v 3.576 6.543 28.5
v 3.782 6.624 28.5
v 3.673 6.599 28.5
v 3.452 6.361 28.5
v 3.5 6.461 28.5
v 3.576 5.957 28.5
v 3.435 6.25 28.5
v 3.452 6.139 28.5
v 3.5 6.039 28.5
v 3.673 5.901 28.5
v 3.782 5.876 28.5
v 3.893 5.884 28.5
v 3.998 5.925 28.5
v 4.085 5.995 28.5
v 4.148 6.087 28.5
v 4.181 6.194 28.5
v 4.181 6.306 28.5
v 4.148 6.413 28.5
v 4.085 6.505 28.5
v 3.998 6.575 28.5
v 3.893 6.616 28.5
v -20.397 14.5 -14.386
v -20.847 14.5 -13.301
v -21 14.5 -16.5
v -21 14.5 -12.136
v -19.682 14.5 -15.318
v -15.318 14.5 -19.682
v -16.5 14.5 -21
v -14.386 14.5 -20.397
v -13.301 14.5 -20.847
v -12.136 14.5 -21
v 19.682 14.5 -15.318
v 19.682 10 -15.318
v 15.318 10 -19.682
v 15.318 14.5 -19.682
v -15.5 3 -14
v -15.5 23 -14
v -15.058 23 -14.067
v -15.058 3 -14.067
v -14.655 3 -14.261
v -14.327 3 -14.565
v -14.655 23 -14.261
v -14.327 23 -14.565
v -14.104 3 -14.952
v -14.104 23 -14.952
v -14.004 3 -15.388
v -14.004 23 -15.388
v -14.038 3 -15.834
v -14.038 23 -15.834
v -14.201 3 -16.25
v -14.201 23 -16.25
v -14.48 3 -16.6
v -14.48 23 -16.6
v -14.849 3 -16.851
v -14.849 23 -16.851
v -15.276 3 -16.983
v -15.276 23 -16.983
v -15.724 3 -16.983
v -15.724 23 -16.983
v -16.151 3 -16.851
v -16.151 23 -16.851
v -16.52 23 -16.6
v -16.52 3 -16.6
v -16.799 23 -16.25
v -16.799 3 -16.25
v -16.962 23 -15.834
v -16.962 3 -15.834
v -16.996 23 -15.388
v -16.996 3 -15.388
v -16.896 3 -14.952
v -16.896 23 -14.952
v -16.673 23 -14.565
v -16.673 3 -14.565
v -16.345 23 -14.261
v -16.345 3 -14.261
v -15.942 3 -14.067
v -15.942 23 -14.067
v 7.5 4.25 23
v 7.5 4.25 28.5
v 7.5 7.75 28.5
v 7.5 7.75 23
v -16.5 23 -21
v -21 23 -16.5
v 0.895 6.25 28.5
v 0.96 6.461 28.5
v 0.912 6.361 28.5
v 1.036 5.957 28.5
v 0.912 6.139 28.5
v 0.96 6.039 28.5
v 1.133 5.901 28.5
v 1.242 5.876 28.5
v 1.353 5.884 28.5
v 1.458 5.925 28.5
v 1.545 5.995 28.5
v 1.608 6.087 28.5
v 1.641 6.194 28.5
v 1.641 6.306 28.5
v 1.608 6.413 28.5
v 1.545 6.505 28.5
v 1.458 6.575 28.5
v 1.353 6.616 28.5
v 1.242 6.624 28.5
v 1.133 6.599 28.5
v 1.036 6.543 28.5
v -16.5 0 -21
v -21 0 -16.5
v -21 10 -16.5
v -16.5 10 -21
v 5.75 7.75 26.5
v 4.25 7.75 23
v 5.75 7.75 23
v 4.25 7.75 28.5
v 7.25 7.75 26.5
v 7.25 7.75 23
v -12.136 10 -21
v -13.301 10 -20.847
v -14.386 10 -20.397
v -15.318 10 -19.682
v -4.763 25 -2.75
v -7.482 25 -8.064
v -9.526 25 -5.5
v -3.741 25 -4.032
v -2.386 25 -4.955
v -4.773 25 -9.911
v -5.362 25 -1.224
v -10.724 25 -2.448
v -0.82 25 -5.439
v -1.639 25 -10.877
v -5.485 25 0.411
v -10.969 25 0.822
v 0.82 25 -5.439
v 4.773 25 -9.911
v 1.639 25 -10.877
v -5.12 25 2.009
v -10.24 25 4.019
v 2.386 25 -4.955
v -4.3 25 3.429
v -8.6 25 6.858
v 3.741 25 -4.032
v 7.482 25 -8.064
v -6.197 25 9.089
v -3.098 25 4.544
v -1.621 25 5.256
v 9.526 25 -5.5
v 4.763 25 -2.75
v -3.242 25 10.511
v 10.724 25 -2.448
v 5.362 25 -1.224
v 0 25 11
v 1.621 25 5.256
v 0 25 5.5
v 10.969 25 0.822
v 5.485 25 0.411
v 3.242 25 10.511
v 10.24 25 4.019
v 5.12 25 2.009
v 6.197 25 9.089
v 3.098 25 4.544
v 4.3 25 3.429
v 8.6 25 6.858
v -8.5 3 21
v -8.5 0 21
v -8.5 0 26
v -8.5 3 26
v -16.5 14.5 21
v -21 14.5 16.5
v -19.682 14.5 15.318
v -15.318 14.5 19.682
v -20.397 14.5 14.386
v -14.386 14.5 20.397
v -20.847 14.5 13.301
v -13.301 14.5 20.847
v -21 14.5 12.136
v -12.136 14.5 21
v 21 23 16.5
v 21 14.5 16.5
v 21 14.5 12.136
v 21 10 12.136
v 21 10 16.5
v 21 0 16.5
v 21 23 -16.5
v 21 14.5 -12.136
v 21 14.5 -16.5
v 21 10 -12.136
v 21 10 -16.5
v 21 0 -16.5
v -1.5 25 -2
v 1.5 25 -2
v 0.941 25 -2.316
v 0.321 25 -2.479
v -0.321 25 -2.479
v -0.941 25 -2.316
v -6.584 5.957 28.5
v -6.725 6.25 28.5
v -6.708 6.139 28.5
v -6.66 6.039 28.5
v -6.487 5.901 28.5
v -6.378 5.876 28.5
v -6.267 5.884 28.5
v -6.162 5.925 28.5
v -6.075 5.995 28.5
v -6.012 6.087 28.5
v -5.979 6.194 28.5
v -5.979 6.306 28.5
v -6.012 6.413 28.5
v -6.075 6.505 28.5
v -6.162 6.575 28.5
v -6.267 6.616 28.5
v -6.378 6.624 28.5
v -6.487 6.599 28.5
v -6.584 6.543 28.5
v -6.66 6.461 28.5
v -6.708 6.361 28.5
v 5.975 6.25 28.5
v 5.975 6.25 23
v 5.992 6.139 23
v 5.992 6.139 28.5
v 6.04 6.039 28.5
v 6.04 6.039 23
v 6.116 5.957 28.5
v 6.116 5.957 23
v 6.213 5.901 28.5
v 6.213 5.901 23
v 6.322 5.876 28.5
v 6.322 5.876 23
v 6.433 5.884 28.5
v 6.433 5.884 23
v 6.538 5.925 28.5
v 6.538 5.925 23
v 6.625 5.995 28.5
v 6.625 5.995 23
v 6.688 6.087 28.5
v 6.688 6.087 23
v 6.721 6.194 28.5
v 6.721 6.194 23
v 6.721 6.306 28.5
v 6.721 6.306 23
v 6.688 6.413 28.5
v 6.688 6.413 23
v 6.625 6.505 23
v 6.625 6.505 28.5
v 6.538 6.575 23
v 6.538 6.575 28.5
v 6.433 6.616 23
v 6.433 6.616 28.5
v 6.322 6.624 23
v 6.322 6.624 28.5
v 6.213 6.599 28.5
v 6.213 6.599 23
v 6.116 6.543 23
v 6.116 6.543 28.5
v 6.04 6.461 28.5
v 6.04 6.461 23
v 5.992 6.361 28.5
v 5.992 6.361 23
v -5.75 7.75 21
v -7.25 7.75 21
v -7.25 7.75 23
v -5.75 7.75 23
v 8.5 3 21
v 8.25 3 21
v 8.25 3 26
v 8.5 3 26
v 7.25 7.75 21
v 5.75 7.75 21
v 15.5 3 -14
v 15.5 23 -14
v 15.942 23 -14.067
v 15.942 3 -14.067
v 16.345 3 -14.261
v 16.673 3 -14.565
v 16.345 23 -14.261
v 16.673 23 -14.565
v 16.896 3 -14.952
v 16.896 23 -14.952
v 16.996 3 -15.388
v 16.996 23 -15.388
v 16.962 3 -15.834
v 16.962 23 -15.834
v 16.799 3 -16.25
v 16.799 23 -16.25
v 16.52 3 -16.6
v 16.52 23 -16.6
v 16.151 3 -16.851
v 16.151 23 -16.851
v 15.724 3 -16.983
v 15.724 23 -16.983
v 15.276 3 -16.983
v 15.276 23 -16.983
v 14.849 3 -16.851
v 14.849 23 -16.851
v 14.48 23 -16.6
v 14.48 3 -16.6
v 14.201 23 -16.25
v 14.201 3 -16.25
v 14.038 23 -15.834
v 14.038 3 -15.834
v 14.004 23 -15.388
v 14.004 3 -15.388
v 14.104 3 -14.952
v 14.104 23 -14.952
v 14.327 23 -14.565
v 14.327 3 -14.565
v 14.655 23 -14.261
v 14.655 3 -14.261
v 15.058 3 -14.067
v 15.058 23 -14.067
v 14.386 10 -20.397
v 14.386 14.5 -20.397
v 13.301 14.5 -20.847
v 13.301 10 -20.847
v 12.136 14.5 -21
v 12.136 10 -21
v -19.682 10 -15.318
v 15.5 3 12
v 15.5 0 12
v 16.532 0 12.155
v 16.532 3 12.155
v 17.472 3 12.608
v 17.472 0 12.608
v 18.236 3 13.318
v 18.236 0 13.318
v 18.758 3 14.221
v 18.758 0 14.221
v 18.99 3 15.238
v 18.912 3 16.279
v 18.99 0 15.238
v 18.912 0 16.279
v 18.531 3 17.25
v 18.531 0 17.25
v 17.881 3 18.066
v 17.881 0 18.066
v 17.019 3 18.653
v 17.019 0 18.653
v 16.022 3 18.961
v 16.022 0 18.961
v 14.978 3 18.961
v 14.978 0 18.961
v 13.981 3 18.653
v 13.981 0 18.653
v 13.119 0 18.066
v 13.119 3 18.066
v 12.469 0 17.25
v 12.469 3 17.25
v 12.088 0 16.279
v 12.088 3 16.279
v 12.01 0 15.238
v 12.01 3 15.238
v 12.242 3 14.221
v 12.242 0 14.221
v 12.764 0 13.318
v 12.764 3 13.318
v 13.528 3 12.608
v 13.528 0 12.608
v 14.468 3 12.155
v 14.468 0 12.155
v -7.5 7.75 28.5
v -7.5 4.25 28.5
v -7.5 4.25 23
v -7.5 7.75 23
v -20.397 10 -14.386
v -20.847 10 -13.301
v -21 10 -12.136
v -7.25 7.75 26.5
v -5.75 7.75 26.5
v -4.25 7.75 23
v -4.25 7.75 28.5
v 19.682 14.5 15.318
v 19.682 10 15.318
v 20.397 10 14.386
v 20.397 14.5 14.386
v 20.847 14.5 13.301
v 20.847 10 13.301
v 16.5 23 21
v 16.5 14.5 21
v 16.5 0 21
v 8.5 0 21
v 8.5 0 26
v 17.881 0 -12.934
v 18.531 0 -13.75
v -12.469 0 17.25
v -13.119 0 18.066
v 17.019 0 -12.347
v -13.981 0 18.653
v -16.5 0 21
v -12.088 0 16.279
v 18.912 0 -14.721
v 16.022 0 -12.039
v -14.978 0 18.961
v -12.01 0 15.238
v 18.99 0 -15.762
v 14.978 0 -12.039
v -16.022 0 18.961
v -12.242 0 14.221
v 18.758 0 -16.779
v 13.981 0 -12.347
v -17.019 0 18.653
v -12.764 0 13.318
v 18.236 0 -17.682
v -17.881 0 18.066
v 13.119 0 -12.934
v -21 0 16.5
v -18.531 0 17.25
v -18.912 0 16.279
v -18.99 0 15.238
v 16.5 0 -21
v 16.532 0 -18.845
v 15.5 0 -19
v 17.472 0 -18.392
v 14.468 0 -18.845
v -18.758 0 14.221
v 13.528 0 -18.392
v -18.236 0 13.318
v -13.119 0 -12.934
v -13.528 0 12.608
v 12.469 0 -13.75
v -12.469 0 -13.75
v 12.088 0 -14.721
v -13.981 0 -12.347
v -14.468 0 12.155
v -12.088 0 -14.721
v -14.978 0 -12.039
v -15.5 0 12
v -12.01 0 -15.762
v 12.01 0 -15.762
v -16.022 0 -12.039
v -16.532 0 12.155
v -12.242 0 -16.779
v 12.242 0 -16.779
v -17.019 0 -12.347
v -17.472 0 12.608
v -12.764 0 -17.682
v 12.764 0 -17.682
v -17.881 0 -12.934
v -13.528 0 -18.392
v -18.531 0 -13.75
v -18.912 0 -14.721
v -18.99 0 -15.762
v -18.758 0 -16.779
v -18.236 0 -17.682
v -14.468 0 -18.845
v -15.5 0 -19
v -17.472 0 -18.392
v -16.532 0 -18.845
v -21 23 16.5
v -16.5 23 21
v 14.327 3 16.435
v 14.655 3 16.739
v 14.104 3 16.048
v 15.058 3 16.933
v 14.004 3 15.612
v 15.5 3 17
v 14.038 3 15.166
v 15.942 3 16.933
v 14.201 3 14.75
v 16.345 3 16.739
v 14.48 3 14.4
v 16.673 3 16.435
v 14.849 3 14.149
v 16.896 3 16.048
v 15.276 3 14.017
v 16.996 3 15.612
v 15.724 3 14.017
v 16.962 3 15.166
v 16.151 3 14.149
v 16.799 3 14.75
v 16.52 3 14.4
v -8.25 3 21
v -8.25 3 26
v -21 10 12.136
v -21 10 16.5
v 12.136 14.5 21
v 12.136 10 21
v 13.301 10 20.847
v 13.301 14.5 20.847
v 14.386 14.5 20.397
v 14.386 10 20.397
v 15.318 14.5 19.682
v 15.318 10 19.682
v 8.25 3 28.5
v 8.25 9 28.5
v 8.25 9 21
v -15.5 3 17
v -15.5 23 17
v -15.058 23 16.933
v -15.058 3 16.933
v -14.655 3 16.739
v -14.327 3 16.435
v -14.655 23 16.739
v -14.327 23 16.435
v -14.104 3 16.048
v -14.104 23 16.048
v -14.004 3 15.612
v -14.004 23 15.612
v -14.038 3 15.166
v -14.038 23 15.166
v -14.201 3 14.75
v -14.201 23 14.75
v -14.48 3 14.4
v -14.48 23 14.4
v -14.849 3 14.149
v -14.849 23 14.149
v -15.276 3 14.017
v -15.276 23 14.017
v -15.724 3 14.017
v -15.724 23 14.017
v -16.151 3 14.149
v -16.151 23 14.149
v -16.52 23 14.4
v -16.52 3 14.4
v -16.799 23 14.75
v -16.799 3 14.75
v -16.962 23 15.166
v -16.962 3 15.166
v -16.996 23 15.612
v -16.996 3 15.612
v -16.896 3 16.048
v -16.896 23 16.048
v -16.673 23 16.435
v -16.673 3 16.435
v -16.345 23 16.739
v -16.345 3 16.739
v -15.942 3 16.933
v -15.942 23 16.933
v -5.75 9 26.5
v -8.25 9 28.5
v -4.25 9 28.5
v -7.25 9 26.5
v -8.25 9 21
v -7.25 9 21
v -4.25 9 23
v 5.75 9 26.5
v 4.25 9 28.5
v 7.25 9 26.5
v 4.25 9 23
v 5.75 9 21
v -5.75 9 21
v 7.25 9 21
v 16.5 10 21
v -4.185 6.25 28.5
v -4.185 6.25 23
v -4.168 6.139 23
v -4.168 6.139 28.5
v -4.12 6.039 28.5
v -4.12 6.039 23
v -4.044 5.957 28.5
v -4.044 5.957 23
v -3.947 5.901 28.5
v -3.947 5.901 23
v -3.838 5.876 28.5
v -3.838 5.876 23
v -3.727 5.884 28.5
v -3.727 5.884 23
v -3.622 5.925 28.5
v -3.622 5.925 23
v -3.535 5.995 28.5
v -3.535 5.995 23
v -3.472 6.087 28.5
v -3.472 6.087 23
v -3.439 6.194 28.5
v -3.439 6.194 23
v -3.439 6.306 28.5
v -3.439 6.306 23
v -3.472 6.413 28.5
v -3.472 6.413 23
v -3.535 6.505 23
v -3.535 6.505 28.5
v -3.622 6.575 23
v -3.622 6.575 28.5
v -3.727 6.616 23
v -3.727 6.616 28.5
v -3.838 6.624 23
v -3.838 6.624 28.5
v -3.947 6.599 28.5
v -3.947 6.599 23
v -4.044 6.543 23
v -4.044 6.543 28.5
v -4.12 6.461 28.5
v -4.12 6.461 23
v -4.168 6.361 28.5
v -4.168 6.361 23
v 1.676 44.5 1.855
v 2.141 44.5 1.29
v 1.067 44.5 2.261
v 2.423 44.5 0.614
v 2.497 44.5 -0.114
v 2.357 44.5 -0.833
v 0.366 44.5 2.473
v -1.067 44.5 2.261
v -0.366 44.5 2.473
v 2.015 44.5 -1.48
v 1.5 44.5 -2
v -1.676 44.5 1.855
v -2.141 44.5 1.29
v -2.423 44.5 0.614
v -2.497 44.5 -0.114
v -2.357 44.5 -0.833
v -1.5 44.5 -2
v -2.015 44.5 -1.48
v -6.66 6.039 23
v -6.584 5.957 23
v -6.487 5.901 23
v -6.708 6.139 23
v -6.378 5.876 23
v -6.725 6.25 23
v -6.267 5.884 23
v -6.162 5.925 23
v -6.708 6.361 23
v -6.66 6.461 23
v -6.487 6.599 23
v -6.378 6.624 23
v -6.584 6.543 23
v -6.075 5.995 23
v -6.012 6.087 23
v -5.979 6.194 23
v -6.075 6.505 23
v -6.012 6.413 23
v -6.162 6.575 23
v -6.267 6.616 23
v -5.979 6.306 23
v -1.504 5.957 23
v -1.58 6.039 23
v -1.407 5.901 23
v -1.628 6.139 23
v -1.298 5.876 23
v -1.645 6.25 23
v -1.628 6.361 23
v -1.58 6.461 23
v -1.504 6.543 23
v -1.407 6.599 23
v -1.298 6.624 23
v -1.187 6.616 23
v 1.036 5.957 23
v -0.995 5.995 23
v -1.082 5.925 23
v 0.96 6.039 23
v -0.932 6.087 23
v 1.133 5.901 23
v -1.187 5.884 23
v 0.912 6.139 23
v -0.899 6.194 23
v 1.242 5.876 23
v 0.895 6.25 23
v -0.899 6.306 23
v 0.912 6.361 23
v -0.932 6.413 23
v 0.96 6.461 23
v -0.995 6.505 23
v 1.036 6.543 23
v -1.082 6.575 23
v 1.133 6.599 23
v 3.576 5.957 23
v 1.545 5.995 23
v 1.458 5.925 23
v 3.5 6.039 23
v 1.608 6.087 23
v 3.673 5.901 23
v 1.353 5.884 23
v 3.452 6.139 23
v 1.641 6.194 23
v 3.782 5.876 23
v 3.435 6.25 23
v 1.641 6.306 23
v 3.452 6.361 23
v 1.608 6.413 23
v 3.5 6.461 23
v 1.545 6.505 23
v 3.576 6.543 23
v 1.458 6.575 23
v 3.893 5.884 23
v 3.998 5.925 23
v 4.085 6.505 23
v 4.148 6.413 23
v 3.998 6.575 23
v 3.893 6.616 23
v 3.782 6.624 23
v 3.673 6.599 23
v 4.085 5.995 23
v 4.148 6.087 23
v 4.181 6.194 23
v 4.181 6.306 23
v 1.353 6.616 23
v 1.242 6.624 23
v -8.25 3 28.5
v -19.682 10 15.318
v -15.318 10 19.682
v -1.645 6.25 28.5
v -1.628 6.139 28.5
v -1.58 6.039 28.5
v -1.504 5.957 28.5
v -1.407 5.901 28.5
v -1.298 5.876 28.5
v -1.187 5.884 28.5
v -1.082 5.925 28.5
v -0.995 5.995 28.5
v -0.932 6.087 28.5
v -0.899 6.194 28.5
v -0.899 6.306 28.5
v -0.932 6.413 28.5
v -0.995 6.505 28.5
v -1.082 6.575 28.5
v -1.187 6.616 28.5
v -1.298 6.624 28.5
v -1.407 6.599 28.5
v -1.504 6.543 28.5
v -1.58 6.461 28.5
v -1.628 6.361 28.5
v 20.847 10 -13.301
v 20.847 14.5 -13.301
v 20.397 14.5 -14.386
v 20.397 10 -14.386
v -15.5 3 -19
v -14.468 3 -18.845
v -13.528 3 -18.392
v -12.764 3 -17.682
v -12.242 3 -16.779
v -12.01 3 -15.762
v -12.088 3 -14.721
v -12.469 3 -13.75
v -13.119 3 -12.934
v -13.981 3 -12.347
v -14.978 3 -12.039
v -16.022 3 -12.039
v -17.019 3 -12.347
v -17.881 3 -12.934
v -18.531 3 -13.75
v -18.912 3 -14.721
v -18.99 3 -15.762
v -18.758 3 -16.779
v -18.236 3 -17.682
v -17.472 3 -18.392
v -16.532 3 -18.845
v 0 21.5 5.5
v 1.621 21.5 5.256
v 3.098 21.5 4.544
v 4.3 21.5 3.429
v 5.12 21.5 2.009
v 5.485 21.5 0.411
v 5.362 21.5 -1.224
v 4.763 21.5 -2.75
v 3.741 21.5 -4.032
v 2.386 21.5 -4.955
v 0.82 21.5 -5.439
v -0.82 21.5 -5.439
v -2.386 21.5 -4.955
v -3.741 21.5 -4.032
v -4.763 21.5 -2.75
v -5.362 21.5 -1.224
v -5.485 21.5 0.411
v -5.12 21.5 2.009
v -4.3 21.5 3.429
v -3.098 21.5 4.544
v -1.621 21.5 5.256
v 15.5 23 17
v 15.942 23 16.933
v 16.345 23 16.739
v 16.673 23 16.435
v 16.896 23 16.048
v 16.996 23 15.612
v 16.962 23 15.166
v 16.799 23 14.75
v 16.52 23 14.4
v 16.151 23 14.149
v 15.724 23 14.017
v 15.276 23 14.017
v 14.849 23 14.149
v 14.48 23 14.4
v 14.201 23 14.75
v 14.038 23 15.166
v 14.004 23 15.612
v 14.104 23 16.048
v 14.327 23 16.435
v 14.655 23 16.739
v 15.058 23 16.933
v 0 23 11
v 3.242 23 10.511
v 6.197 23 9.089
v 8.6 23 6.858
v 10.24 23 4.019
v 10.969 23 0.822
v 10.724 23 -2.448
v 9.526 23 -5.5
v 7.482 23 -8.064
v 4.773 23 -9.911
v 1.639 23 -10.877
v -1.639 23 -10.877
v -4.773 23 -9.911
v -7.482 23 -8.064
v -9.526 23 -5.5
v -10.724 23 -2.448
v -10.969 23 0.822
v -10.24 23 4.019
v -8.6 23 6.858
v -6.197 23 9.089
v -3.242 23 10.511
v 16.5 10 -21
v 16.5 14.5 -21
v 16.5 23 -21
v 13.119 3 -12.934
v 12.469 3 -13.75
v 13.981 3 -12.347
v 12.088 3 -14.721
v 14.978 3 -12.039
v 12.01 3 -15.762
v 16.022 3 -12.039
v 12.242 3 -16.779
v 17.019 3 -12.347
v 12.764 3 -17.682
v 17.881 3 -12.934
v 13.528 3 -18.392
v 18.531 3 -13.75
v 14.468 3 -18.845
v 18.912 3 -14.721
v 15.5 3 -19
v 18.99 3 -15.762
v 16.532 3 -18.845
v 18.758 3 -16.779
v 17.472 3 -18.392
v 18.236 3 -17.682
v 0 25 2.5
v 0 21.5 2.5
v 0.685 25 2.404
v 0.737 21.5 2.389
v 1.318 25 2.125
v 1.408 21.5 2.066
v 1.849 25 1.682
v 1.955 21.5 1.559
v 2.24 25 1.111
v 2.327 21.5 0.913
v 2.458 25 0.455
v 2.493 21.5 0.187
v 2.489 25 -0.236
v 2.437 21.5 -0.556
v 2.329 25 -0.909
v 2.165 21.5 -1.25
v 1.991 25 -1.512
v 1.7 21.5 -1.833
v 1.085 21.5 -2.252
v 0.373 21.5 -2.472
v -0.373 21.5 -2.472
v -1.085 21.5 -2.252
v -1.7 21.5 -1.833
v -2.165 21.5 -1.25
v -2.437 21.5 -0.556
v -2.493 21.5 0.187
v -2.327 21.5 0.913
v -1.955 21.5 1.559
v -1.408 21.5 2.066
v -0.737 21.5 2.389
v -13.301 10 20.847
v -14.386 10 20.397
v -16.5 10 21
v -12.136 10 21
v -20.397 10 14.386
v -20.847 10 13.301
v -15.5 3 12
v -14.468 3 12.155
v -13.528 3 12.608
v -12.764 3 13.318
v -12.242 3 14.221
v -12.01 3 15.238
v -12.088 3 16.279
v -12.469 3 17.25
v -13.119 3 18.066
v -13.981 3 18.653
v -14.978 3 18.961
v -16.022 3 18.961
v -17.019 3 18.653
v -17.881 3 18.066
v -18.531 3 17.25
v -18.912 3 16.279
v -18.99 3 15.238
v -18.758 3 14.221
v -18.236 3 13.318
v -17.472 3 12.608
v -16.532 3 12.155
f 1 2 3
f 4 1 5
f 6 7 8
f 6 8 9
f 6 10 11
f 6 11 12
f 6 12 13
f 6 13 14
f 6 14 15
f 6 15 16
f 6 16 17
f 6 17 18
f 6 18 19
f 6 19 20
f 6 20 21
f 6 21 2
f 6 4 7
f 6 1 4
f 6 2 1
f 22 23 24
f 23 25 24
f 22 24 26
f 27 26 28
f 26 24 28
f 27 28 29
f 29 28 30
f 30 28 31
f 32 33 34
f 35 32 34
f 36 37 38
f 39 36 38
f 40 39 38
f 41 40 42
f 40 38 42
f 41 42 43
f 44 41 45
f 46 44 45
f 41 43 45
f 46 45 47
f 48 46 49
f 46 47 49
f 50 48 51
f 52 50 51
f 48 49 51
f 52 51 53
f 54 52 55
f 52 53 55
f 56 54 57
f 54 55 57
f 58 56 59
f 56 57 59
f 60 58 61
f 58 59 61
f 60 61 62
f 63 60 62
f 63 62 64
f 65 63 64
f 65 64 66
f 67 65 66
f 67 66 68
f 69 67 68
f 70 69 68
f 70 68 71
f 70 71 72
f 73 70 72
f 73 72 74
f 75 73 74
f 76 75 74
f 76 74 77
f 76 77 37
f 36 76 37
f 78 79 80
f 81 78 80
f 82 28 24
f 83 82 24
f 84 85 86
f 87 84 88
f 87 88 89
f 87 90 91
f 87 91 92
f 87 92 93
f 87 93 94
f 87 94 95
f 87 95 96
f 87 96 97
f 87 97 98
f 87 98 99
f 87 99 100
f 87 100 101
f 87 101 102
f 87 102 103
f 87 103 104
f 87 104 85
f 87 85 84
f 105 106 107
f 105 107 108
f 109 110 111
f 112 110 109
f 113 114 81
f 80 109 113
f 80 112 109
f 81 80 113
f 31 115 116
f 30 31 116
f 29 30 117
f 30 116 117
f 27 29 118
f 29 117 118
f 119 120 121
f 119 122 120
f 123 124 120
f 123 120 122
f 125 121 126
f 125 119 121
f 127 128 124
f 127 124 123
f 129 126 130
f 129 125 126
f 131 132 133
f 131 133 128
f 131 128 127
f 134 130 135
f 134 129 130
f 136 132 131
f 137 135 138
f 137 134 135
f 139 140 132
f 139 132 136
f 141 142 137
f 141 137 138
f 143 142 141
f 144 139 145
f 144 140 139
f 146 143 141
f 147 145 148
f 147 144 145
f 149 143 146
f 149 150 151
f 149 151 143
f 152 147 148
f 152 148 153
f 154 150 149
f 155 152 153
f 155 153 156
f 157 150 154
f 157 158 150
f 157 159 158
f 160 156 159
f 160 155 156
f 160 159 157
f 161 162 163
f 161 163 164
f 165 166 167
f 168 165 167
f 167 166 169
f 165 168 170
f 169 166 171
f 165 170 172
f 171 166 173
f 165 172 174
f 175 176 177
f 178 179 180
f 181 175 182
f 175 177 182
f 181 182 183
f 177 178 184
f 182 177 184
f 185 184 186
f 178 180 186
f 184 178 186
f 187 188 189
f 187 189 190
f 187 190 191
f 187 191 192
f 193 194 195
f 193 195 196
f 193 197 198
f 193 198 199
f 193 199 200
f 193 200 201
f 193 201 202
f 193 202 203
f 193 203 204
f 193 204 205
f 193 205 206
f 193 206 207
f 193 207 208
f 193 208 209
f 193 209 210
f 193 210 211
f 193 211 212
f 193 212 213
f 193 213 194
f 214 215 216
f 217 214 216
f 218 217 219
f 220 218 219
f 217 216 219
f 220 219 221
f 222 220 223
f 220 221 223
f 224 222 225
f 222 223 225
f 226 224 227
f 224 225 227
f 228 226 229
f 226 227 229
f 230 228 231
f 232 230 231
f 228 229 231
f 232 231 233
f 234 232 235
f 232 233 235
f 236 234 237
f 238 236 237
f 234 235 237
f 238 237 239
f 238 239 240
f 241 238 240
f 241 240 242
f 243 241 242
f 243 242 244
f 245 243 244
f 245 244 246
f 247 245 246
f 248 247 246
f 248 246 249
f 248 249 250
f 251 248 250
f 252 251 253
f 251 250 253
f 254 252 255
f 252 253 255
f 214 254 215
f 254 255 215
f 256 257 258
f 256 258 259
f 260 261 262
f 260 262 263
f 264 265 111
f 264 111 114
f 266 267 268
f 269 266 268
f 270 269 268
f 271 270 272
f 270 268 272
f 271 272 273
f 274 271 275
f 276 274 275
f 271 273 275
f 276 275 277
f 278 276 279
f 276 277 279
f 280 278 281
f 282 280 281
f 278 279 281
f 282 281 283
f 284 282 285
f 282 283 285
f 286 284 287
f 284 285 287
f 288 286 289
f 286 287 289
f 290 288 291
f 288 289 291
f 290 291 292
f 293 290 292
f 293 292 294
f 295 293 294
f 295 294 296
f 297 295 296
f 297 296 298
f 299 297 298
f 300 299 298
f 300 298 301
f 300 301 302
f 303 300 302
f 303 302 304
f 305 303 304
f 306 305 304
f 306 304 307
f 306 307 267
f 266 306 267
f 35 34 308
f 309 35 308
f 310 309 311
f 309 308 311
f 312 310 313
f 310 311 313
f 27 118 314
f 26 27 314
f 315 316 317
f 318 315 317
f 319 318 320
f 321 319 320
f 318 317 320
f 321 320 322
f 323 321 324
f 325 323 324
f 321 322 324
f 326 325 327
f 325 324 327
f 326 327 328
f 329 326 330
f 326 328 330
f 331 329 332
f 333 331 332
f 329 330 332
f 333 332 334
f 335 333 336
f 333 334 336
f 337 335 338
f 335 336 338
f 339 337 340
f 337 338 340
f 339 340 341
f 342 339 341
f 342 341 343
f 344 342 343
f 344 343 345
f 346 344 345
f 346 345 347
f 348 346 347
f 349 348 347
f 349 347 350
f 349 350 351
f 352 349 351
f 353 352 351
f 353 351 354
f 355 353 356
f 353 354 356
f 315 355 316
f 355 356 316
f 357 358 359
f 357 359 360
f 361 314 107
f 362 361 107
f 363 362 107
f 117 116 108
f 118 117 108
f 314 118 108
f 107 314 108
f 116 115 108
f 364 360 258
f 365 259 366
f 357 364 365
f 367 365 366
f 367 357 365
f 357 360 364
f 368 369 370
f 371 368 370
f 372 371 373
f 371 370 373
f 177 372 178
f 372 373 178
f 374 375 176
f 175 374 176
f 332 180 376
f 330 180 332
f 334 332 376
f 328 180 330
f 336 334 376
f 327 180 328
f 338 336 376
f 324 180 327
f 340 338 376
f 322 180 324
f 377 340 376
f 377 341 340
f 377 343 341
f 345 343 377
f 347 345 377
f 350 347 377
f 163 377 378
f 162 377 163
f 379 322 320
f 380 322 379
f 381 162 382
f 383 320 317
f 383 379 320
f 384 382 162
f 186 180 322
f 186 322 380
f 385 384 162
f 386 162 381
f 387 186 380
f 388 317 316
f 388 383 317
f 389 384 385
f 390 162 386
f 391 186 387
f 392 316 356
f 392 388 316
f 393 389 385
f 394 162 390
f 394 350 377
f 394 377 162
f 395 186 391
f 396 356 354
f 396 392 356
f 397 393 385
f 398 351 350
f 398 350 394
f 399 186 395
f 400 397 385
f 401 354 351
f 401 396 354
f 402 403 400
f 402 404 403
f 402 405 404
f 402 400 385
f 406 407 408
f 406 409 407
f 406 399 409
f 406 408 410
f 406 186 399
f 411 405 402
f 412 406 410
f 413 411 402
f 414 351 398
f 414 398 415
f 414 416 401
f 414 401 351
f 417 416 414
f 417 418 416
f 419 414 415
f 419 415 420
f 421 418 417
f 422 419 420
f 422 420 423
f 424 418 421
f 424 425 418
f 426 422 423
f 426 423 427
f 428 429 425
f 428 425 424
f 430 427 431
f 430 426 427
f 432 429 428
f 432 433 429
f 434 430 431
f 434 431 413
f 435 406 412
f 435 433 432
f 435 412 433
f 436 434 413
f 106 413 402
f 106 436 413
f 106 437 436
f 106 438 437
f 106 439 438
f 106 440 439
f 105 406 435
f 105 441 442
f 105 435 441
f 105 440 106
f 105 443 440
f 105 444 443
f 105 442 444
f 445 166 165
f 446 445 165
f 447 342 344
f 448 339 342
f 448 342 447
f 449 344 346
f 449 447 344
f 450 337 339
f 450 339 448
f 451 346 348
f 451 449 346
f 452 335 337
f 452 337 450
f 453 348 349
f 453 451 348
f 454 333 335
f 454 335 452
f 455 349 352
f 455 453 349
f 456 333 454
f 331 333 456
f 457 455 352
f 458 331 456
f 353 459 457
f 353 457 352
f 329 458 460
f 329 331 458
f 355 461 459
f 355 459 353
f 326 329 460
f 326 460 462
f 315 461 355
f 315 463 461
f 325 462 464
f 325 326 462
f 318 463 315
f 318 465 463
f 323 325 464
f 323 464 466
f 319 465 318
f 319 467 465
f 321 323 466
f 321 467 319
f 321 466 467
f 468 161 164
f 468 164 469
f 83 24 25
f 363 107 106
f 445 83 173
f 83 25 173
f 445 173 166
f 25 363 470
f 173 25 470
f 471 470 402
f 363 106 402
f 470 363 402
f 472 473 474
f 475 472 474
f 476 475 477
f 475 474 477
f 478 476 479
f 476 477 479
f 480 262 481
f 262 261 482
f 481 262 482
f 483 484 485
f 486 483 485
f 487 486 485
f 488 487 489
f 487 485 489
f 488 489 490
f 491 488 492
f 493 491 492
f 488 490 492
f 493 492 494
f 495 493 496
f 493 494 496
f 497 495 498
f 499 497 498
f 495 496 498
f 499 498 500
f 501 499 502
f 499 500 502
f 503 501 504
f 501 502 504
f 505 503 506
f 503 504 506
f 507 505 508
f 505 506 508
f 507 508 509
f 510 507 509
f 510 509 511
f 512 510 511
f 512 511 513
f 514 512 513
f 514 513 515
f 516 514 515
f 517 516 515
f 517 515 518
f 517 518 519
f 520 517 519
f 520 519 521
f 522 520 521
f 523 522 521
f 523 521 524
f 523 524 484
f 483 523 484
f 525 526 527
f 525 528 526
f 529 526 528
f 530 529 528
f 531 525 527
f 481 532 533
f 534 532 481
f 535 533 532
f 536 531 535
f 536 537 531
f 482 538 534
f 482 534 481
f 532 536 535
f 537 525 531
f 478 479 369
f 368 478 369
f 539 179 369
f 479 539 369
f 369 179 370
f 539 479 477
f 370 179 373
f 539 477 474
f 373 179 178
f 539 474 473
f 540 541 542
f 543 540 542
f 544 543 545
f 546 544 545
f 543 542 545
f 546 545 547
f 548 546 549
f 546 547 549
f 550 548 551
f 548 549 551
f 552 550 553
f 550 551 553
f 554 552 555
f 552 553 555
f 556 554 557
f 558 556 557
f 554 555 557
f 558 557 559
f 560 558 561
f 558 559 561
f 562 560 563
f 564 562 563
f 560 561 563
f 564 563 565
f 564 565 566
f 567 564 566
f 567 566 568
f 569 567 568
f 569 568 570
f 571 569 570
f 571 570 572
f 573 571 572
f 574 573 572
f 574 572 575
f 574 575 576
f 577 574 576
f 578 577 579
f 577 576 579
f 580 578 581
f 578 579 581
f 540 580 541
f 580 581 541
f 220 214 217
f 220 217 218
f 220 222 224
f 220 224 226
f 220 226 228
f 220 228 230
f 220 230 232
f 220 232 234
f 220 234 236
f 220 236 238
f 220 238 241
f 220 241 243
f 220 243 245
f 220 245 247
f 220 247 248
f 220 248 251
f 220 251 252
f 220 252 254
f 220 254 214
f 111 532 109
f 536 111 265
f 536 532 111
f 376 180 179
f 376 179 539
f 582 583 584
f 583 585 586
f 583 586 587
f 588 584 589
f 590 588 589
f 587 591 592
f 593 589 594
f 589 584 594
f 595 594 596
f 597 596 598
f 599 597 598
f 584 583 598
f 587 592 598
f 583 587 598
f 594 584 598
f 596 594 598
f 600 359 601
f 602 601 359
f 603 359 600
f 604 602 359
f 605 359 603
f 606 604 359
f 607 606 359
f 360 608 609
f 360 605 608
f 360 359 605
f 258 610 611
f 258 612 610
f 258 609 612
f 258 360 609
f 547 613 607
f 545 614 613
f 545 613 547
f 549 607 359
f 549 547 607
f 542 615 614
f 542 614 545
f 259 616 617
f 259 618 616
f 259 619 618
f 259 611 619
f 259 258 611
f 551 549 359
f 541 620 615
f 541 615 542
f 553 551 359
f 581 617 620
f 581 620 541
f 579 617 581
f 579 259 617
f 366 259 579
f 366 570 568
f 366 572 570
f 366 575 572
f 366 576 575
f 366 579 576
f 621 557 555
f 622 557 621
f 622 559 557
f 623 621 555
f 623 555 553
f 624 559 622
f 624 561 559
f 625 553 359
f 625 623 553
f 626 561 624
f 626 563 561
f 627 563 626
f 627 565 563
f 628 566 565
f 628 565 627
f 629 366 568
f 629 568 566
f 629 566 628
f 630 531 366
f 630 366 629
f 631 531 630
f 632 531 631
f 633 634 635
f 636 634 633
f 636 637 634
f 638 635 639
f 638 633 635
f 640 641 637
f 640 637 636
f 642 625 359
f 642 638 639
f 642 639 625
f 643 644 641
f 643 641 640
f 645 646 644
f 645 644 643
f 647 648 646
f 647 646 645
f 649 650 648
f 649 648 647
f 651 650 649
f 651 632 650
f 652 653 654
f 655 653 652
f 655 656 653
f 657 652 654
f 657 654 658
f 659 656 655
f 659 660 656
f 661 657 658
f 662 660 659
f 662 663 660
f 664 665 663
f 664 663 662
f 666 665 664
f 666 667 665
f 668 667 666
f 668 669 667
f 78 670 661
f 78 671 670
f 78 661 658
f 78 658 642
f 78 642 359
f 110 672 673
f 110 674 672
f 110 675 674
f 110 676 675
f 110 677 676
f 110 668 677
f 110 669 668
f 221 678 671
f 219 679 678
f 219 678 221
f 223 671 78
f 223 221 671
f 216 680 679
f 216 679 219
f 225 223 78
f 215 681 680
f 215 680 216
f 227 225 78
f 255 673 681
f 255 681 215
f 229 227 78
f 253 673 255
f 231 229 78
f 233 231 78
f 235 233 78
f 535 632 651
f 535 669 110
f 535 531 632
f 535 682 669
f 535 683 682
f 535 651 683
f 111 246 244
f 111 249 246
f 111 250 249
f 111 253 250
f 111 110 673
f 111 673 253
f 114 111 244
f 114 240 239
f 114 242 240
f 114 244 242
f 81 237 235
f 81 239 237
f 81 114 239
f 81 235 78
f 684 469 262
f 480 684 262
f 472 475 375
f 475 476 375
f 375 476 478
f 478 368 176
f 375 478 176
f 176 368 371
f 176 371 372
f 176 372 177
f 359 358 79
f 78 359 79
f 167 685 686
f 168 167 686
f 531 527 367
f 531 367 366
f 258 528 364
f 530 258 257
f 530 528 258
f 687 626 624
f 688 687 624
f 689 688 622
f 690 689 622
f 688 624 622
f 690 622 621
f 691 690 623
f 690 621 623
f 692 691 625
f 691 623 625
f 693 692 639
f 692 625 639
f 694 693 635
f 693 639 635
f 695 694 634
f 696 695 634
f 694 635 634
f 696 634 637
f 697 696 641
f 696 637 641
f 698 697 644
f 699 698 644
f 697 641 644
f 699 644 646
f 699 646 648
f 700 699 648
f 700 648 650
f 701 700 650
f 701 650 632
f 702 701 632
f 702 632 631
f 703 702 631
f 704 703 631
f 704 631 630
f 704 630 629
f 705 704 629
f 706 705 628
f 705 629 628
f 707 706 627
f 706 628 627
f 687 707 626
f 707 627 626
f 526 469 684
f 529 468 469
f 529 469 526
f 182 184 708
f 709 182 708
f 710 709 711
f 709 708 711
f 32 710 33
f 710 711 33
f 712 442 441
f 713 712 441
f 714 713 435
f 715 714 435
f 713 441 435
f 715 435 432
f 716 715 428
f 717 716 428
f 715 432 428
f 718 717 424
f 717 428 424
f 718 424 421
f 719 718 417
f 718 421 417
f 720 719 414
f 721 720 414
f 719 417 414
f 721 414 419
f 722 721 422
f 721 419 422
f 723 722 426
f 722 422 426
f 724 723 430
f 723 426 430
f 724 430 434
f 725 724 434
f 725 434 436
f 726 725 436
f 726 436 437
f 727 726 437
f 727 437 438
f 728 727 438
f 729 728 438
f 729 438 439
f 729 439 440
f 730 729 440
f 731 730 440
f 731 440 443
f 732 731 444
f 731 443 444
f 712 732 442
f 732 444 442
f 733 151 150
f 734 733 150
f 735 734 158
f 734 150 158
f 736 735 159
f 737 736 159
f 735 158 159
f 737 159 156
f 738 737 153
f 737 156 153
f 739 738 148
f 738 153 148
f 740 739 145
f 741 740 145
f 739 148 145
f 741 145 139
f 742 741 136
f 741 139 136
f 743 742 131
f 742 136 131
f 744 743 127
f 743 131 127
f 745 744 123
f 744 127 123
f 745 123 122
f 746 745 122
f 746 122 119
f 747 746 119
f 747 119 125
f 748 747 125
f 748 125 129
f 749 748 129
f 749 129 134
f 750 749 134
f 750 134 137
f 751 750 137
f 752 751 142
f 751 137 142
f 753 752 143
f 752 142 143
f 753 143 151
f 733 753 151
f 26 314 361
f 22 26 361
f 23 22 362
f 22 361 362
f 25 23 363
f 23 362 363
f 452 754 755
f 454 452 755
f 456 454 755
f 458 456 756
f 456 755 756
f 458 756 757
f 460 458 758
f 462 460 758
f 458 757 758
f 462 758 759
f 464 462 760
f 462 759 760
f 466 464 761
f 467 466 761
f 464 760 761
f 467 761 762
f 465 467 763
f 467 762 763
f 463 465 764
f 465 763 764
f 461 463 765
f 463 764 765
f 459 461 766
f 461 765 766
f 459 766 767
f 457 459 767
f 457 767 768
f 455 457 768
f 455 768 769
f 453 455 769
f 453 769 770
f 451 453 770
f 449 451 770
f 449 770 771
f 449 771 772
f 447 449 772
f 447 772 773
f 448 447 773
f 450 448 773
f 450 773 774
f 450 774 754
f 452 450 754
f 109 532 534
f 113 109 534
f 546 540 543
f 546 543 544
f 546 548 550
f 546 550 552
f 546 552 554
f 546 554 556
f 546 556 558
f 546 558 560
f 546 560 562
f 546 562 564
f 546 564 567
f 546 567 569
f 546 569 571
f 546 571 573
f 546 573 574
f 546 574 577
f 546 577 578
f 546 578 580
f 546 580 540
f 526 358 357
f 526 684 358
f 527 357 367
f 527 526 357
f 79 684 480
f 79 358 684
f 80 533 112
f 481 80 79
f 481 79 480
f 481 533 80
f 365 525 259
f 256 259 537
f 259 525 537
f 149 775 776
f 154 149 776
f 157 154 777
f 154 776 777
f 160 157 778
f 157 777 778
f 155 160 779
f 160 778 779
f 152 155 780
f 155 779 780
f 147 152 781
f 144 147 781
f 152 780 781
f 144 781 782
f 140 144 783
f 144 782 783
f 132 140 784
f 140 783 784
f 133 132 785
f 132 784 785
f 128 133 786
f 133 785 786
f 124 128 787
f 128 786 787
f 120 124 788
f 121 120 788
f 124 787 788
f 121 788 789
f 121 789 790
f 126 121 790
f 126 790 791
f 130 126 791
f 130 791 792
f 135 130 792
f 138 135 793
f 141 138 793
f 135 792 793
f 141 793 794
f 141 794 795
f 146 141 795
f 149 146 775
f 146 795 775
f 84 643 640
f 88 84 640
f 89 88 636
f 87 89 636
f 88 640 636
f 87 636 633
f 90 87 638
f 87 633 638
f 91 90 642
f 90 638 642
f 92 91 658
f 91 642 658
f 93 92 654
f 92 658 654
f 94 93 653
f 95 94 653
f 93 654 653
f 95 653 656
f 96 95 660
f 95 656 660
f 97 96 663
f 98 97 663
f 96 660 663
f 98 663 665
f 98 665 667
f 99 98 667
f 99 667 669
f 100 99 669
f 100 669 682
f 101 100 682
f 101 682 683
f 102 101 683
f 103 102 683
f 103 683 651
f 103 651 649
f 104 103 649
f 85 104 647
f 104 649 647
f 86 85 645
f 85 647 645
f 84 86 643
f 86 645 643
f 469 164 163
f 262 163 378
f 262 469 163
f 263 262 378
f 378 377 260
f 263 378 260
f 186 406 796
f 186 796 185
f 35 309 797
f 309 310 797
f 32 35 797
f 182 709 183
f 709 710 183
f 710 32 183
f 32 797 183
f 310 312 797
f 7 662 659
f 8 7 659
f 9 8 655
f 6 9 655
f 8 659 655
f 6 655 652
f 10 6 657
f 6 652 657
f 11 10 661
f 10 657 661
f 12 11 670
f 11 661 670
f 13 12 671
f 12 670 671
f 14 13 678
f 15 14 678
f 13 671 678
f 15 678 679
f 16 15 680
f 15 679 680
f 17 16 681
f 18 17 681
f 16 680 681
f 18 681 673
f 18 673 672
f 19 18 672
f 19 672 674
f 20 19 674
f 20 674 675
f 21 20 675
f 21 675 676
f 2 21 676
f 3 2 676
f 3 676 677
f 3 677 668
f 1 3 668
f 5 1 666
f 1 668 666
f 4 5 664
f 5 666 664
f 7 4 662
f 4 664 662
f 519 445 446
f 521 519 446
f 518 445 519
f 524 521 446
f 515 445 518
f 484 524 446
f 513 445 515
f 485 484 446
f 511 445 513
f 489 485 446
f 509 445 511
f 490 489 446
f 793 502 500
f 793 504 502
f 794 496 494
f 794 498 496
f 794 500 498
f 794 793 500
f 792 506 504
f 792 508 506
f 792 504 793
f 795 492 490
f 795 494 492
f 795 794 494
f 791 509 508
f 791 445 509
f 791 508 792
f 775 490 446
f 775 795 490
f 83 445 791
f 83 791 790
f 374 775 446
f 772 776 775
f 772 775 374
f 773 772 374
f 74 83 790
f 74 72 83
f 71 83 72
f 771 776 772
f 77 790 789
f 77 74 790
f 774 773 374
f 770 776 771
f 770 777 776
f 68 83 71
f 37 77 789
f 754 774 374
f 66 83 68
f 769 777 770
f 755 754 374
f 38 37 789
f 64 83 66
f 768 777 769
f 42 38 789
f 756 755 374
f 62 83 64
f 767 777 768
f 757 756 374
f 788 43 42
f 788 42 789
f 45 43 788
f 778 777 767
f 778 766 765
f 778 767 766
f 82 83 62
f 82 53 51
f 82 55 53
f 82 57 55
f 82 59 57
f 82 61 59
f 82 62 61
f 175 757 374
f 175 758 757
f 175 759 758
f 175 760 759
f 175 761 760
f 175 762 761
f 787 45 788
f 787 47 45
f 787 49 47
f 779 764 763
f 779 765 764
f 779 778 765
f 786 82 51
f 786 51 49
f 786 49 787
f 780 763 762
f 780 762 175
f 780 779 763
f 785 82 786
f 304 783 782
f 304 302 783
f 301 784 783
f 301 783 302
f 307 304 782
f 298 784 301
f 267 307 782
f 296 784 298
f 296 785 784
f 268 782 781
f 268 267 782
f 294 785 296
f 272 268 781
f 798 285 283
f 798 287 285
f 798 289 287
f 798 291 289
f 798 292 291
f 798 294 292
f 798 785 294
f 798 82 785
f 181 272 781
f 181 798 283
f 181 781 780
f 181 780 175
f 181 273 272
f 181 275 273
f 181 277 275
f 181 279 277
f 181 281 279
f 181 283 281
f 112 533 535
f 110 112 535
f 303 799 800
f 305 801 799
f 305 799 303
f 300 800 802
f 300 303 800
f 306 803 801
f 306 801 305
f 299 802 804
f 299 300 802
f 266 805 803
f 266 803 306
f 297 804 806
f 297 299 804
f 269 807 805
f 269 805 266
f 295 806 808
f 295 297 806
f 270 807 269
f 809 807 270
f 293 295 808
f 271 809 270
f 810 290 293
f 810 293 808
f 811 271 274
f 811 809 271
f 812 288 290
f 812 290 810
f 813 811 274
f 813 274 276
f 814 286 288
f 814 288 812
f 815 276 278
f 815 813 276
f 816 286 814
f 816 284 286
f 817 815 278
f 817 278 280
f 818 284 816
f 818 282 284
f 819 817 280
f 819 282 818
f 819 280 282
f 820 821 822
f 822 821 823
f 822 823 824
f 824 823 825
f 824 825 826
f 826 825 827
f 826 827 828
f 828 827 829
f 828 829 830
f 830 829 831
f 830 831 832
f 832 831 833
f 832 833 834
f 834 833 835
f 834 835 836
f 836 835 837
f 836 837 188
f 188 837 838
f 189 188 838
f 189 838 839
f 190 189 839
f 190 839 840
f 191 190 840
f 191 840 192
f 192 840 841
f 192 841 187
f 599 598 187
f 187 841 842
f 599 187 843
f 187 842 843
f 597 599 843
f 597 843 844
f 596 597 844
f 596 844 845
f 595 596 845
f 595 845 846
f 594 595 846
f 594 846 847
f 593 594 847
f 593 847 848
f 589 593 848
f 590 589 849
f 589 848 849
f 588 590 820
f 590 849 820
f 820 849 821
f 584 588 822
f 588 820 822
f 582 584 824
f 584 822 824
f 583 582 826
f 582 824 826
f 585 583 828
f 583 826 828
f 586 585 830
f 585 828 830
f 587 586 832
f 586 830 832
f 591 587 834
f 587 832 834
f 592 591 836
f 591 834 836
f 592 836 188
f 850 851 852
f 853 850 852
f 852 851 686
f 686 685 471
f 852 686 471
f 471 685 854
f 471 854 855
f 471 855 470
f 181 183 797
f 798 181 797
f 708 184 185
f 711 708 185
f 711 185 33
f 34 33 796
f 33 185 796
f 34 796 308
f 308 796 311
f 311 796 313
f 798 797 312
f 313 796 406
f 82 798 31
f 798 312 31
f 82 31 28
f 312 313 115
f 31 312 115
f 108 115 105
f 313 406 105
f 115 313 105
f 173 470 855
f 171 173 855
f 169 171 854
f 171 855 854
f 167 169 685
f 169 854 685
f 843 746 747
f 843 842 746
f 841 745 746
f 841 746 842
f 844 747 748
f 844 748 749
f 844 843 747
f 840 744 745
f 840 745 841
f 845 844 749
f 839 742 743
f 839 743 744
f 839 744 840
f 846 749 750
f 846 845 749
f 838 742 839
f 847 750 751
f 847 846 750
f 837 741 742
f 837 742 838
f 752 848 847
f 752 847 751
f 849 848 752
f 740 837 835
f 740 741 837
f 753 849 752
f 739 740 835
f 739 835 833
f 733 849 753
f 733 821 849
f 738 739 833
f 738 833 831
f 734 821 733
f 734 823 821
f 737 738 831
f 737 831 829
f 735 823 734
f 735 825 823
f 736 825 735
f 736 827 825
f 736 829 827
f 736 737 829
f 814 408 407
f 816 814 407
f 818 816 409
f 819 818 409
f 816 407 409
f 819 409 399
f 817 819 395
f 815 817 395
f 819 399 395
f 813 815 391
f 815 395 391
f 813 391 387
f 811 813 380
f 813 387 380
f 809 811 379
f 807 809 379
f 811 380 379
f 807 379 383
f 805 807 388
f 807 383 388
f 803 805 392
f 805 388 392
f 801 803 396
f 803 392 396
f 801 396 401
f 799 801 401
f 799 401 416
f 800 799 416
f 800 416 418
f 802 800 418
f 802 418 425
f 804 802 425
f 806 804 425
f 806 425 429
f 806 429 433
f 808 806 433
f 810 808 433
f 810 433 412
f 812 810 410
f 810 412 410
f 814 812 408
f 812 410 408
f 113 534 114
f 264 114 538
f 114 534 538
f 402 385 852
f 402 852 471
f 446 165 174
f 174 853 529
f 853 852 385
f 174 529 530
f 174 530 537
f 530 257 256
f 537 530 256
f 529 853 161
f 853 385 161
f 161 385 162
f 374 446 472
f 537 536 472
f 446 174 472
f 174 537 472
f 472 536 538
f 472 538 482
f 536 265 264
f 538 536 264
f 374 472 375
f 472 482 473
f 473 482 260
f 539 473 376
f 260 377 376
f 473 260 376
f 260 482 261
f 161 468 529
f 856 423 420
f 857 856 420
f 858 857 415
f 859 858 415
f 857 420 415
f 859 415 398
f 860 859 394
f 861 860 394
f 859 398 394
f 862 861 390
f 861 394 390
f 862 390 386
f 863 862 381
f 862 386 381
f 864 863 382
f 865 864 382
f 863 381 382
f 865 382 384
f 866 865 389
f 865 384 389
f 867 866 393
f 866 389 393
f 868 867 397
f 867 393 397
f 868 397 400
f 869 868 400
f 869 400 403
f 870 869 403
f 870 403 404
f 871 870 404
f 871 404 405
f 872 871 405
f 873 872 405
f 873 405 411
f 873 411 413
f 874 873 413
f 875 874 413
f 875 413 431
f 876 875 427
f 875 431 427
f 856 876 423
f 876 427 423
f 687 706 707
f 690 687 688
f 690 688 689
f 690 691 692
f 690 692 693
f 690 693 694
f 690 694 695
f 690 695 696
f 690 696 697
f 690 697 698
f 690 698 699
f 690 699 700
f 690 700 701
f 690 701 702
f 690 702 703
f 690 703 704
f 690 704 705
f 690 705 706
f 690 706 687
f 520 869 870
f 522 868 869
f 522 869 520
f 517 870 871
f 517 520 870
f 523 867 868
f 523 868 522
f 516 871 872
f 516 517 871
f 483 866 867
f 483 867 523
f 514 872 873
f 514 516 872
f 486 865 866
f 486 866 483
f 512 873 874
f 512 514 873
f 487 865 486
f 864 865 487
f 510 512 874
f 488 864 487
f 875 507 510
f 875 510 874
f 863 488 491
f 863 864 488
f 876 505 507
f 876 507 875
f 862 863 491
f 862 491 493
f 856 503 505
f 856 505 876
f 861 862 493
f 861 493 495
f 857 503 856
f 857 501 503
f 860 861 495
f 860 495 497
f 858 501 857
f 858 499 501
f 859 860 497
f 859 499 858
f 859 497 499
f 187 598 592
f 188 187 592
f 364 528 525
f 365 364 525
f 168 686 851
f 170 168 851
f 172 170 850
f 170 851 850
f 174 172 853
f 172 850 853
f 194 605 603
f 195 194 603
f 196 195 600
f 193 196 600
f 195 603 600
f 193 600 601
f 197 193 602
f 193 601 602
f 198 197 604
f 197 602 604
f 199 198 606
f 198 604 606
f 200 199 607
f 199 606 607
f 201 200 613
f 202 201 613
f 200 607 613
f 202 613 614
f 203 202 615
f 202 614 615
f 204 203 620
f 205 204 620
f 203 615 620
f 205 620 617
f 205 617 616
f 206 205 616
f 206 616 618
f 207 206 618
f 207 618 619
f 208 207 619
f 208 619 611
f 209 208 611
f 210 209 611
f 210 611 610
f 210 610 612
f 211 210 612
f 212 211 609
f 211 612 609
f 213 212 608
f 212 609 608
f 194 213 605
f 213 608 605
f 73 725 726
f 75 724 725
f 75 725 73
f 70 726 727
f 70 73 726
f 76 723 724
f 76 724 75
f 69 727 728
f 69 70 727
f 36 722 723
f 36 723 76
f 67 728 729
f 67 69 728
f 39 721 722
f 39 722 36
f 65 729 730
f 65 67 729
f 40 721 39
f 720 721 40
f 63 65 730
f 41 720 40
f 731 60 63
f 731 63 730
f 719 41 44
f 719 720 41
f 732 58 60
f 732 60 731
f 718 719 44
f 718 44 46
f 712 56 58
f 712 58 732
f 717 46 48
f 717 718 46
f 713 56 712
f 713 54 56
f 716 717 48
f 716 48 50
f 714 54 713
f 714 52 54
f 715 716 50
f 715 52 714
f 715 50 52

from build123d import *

# Parameters (mm, degrees)
BOSS_EXTRUDE1_DEPTH  = 10
BOSS_EXTRUDE3_DEPTH  = 4.5
BOSS_EXTRUDE4_DEPTH  = 8.5
SKETCH5_R            = 11
BOSS_EXTRUDE5_DEPTH  = 2
CUT_EXTRUDE1_REACH   = 39.563
SKETCH6_R            = 1.5
SKETCH7_R            = 5.5
CUT_EXTRUDE2_DEPTH   = 3.5
SKETCH8_R            = 2.5
BOSS_EXTRUDE6_DEPTH  = 3.5
BOSS_EXTRUDE7_DEPTH  = 19.5
SKETCH10_R           = 3.5
CUT_EXTRUDE3_DEPTH   = 3
SKETCH11_W           = 17
SKETCH11_H           = 3
BOSS_EXTRUDE8_DEPTH  = 5
SKETCH12_W           = 16.5
SKETCH12_H           = 6
BOSS_EXTRUDE9_DEPTH  = 7.5
SKETCH13_W           = 15
SKETCH13_H           = 3.5
CUT_EXTRUDE4_DEPTH   = 5.5
CUT_EXTRUDE5_REACH   = 52.135
SKETCH14_W           = 8.5
SKETCH14_H           = 5.5
SKETCH15_W           = 1.5
SKETCH15_H           = 5.5
CUT_EXTRUDE6_DEPTH   = 1.25
SKETCH16_R           = 0.375
BOSS_EXTRUDE10_DEPTH = 5.5


with BuildPart() as part:
    # Sketch1 → Boss-Extrude1 (new body)
    with BuildSketch(Plane(origin=(0, 0, 0), x_dir=(1, 0, 0), z_dir=(0, 1, 0))):
        Polygon((-21, 16.5), (-16.5, 21), (16.5, 21), (21, 16.5), (21, -16.5), (16.5, -21), (-16.5, -21), (-21, -16.5), align=None)
    extrude(amount=BOSS_EXTRUDE1_DEPTH)

    # Sketch2 → Boss-Extrude3 (add)
    with BuildSketch(Plane(origin=(0, 10, 0), x_dir=(1, 0, 0), z_dir=(0, 1, 0))):
        with BuildLine():
            Line((-15.318019485, 19.681980515), (-19.681980515, 15.318019485))
            ThreePointArc((-19.681980515, 15.318019485), (-20.657457896, 13.858114415), (-21, 12.136038969))
            Line((-21, 12.136038969), (-21, -12.136038969))
            ThreePointArc((-21, -12.136038969), (-20.657457896, -13.858114415), (-19.681980515, -15.318019485))
            Line((-19.681980515, -15.318019485), (-15.318019485, -19.681980515))
            ThreePointArc((-15.318019485, -19.681980515), (-13.858114415, -20.657457896), (-12.136038969, -21))
            Line((-12.136038969, -21), (12.136038969, -21))
            ThreePointArc((12.136038969, -21), (13.858114415, -20.657457896), (15.318019485, -19.681980515))
            Line((15.318019485, -19.681980515), (19.681980515, -15.318019485))
            ThreePointArc((19.681980515, -15.318019485), (20.657457896, -13.858114415), (21, -12.136038969))
            Line((21, -12.136038969), (21, 12.136038969))
            ThreePointArc((21, 12.136038969), (20.657457896, 13.858114415), (19.681980515, 15.318019485))
            Line((19.681980515, 15.318019485), (15.318019485, 19.681980515))
            ThreePointArc((15.318019485, 19.681980515), (13.858114415, 20.657457896), (12.136038969, 21))
            Line((12.136038969, 21), (-12.136038969, 21))
            ThreePointArc((-12.136038969, 21), (-13.858114415, 20.657457896), (-15.318019485, 19.681980515))
        make_face()
    extrude(amount=BOSS_EXTRUDE3_DEPTH)

    # Sketch4 → Boss-Extrude4 (add)
    with BuildSketch(Plane(origin=(0, 14.5, 0), x_dir=(1, 0, 0), z_dir=(0, 1, 0))):
        Polygon((-16.5, 21), (-21, 16.5), (-21, -16.5), (-16.5, -21), (16.5, -21), (21, -16.5), (21, 16.5), (16.5, 21), align=None)
    extrude(amount=BOSS_EXTRUDE4_DEPTH)

    # Sketch5 → Boss-Extrude5 (add)
    with BuildSketch(Plane(origin=(0, 23, 0), x_dir=(1, 0, 0), z_dir=(0, 1, 0))):
        with Locations(Location((0, 0, 0), (0, 0, 270))):
            Circle(SKETCH5_R)
    extrude(amount=BOSS_EXTRUDE5_DEPTH)

    # Sketch6 → Cut-Extrude1 (cut, up to next)
    with BuildSketch(Plane(origin=(0, 23, 0), x_dir=(1, 0, 0), z_dir=(0, 1, 0)), mode=Mode.PRIVATE) as cut_extrude1_sk1:
        with Locations(Location((-15.5, 15.5, 0), (0, 0, 270))):
            Circle(SKETCH6_R)
    cut_extrude1_tool1 = extrude(cut_extrude1_sk1.sketch, amount=-CUT_EXTRUDE1_REACH, mode=Mode.PRIVATE) & part.part
    # Sketch6 → Cut-Extrude1 (cut, up to next)
    with BuildSketch(Plane(origin=(0, 23, 0), x_dir=(1, 0, 0), z_dir=(0, 1, 0)), mode=Mode.PRIVATE) as cut_extrude1_sk2:
        with Locations(Location((15.5, 15.5, 0), (0, 0, 270))):
            Circle(SKETCH6_R)
    cut_extrude1_tool2 = extrude(cut_extrude1_sk2.sketch, amount=-CUT_EXTRUDE1_REACH, mode=Mode.PRIVATE) & part.part
    # Sketch6 → Cut-Extrude1 (cut, up to next)
    with BuildSketch(Plane(origin=(0, 23, 0), x_dir=(1, 0, 0), z_dir=(0, 1, 0)), mode=Mode.PRIVATE) as cut_extrude1_sk3:
        with Locations(Location((15.5, -15.5, 0), (0, 0, 270))):
            Circle(SKETCH6_R)
    cut_extrude1_tool3 = extrude(cut_extrude1_sk3.sketch, amount=-CUT_EXTRUDE1_REACH, mode=Mode.PRIVATE) & part.part
    # Sketch6 → Cut-Extrude1 (cut, up to next)
    with BuildSketch(Plane(origin=(0, 23, 0), x_dir=(1, 0, 0), z_dir=(0, 1, 0)), mode=Mode.PRIVATE) as cut_extrude1_sk4:
        with Locations(Location((-15.5, -15.5, 0), (0, 0, 270))):
            Circle(SKETCH6_R)
    cut_extrude1_tool4 = extrude(cut_extrude1_sk4.sketch, amount=-CUT_EXTRUDE1_REACH, mode=Mode.PRIVATE) & part.part
    add(cut_extrude1_tool1.solids().sort_by_distance((-15.5, 23, -15.5))[0], mode=Mode.SUBTRACT)
    add(cut_extrude1_tool2.solids().sort_by_distance((15.5, 23, -15.5))[0], mode=Mode.SUBTRACT)
    add(cut_extrude1_tool3.solids().sort_by_distance((15.5, 23, 15.5))[0], mode=Mode.SUBTRACT)
    add(cut_extrude1_tool4.solids().sort_by_distance((-15.5, 23, 15.5))[0], mode=Mode.SUBTRACT)

    # Sketch7 → Cut-Extrude2 (cut)
    with BuildSketch(Plane(origin=(0, 25, 0), x_dir=(1, 0, 0), z_dir=(0, 1, 0))):
        with Locations(Location((0, 0, 0), (0, 0, 270))):
            Circle(SKETCH7_R)
    extrude(amount=-CUT_EXTRUDE2_DEPTH, mode=Mode.SUBTRACT)

    # Sketch8 → Boss-Extrude6 (add)
    with BuildSketch(Plane(origin=(0, 21.5, 0), x_dir=(1, 0, 0), z_dir=(0, 1, 0))):
        with Locations(Location((0, 0, 0), (0, 0, 270))):
            Circle(SKETCH8_R)
    extrude(amount=BOSS_EXTRUDE6_DEPTH)

    # Sketch9 → Boss-Extrude7 (add)
    with BuildSketch(Plane(origin=(0, 25, 0), x_dir=(1, 0, 0), z_dir=(0, 1, 0))):
        with BuildLine():
            Line((-1.5, 2), (1.5, 2))
            ThreePointArc((1.5, 2), (0, -2.5), (-1.5, 2))
        make_face()
    extrude(amount=BOSS_EXTRUDE7_DEPTH)

    # Sketch10 → Cut-Extrude3 (cut)
    with BuildSketch(Plane.XZ):
        with Locations(Location((-15.5, 15.5, 0), (0, 0, 270))):
            Circle(SKETCH10_R)
        with Locations(Location((15.5, 15.5, 0), (0, 0, 270))):
            Circle(SKETCH10_R)
        with Locations(Location((15.5, -15.5, 0), (0, 0, 270))):
            Circle(SKETCH10_R)
        with Locations(Location((-15.5, -15.5, 0), (0, 0, 270))):
            Circle(SKETCH10_R)
    extrude(amount=-CUT_EXTRUDE3_DEPTH, mode=Mode.SUBTRACT)

    # Sketch11 → Boss-Extrude8 (add)
    with BuildSketch(Plane.XY.offset(21)):
        with Locations((0, 1.5)):
            Rectangle(SKETCH11_W, SKETCH11_H)
    extrude(amount=BOSS_EXTRUDE8_DEPTH)

    # Sketch12 → Boss-Extrude9 (add)
    with BuildSketch(Plane.XY.offset(21)):
        with Locations((0, 6)):
            Rectangle(SKETCH12_W, SKETCH12_H)
    extrude(amount=BOSS_EXTRUDE9_DEPTH)

    # Sketch13 → Cut-Extrude4 (cut)
    with BuildSketch(Plane.XY.offset(28.5)):
        with Locations((0, 6)):
            Rectangle(SKETCH13_W, SKETCH13_H)
    extrude(amount=-CUT_EXTRUDE4_DEPTH, mode=Mode.SUBTRACT)

    # Sketch14 → Cut-Extrude5 (cut, up to next)
    with BuildSketch(Plane(origin=(0, 9, 0), x_dir=(1, 0, 0), z_dir=(0, 1, 0)), mode=Mode.PRIVATE) as cut_extrude5_sk1:
        with Locations((0, -25.75)):
            Rectangle(SKETCH14_W, SKETCH14_H)
    cut_extrude5_tool1 = extrude(cut_extrude5_sk1.sketch, amount=-CUT_EXTRUDE5_REACH, mode=Mode.PRIVATE) & part.part
    add(cut_extrude5_tool1.solids().sort_by_distance((0, 9, 25.75))[0], mode=Mode.SUBTRACT)

    # Sketch15 → Cut-Extrude6 (cut)
    with BuildSketch(Plane(origin=(0, 9, 0), x_dir=(1, 0, 0), z_dir=(0, 1, 0))):
        with Locations((-6.5, -23.75)):
            Rectangle(SKETCH15_W, SKETCH15_H)
        with Locations((6.5, -23.75)):
            Rectangle(SKETCH15_W, SKETCH15_H)
    extrude(amount=-CUT_EXTRUDE6_DEPTH, mode=Mode.SUBTRACT)

    # Sketch16 → Boss-Extrude10 (add)
    with BuildSketch(Plane.XY.offset(23)):
        with Locations(Location((-1.27, 6.25, 0), (0, 0, 180))):
            Circle(SKETCH16_R)
        with Locations(Location((1.27, 6.25, 0), (0, 0, 180))):
            Circle(SKETCH16_R)
        with Locations(Location((-3.81, 6.25, 0), (0, 0, 180))):
            Circle(SKETCH16_R)
        with Locations(Location((-6.35, 6.25, 0), (0, 0, 180))):
            Circle(SKETCH16_R)
        with Locations(Location((3.81, 6.25, 0), (0, 0, 180))):
            Circle(SKETCH16_R)
        with Locations(Location((6.35, 6.25, 0), (0, 0, 180))):
            Circle(SKETCH16_R)
    extrude(amount=BOSS_EXTRUDE10_DEPTH)


solid = part.part
